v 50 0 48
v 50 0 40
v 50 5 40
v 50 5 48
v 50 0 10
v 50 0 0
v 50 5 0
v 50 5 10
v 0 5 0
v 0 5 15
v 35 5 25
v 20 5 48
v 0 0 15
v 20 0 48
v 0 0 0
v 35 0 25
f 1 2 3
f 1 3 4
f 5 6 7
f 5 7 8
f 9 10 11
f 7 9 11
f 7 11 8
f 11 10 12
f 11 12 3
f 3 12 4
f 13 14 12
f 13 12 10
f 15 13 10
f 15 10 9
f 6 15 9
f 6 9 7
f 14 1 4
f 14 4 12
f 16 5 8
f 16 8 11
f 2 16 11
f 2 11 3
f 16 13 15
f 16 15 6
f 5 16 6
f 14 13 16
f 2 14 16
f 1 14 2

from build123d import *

# Parameters (mm, degrees)
F1_DEPTH = 5


with BuildPart() as f1:
    # F0 (on Front) → F1 (new body)
    with BuildSketch(Plane.XZ):
        Polygon((0, 15), (0, 0), (35, 0), (50, 0), (50, 10), (35, 25), (50, 40), (50, 48), (20, 48), align=None)
    extrude(amount=-F1_DEPTH)


solid = f1.part
